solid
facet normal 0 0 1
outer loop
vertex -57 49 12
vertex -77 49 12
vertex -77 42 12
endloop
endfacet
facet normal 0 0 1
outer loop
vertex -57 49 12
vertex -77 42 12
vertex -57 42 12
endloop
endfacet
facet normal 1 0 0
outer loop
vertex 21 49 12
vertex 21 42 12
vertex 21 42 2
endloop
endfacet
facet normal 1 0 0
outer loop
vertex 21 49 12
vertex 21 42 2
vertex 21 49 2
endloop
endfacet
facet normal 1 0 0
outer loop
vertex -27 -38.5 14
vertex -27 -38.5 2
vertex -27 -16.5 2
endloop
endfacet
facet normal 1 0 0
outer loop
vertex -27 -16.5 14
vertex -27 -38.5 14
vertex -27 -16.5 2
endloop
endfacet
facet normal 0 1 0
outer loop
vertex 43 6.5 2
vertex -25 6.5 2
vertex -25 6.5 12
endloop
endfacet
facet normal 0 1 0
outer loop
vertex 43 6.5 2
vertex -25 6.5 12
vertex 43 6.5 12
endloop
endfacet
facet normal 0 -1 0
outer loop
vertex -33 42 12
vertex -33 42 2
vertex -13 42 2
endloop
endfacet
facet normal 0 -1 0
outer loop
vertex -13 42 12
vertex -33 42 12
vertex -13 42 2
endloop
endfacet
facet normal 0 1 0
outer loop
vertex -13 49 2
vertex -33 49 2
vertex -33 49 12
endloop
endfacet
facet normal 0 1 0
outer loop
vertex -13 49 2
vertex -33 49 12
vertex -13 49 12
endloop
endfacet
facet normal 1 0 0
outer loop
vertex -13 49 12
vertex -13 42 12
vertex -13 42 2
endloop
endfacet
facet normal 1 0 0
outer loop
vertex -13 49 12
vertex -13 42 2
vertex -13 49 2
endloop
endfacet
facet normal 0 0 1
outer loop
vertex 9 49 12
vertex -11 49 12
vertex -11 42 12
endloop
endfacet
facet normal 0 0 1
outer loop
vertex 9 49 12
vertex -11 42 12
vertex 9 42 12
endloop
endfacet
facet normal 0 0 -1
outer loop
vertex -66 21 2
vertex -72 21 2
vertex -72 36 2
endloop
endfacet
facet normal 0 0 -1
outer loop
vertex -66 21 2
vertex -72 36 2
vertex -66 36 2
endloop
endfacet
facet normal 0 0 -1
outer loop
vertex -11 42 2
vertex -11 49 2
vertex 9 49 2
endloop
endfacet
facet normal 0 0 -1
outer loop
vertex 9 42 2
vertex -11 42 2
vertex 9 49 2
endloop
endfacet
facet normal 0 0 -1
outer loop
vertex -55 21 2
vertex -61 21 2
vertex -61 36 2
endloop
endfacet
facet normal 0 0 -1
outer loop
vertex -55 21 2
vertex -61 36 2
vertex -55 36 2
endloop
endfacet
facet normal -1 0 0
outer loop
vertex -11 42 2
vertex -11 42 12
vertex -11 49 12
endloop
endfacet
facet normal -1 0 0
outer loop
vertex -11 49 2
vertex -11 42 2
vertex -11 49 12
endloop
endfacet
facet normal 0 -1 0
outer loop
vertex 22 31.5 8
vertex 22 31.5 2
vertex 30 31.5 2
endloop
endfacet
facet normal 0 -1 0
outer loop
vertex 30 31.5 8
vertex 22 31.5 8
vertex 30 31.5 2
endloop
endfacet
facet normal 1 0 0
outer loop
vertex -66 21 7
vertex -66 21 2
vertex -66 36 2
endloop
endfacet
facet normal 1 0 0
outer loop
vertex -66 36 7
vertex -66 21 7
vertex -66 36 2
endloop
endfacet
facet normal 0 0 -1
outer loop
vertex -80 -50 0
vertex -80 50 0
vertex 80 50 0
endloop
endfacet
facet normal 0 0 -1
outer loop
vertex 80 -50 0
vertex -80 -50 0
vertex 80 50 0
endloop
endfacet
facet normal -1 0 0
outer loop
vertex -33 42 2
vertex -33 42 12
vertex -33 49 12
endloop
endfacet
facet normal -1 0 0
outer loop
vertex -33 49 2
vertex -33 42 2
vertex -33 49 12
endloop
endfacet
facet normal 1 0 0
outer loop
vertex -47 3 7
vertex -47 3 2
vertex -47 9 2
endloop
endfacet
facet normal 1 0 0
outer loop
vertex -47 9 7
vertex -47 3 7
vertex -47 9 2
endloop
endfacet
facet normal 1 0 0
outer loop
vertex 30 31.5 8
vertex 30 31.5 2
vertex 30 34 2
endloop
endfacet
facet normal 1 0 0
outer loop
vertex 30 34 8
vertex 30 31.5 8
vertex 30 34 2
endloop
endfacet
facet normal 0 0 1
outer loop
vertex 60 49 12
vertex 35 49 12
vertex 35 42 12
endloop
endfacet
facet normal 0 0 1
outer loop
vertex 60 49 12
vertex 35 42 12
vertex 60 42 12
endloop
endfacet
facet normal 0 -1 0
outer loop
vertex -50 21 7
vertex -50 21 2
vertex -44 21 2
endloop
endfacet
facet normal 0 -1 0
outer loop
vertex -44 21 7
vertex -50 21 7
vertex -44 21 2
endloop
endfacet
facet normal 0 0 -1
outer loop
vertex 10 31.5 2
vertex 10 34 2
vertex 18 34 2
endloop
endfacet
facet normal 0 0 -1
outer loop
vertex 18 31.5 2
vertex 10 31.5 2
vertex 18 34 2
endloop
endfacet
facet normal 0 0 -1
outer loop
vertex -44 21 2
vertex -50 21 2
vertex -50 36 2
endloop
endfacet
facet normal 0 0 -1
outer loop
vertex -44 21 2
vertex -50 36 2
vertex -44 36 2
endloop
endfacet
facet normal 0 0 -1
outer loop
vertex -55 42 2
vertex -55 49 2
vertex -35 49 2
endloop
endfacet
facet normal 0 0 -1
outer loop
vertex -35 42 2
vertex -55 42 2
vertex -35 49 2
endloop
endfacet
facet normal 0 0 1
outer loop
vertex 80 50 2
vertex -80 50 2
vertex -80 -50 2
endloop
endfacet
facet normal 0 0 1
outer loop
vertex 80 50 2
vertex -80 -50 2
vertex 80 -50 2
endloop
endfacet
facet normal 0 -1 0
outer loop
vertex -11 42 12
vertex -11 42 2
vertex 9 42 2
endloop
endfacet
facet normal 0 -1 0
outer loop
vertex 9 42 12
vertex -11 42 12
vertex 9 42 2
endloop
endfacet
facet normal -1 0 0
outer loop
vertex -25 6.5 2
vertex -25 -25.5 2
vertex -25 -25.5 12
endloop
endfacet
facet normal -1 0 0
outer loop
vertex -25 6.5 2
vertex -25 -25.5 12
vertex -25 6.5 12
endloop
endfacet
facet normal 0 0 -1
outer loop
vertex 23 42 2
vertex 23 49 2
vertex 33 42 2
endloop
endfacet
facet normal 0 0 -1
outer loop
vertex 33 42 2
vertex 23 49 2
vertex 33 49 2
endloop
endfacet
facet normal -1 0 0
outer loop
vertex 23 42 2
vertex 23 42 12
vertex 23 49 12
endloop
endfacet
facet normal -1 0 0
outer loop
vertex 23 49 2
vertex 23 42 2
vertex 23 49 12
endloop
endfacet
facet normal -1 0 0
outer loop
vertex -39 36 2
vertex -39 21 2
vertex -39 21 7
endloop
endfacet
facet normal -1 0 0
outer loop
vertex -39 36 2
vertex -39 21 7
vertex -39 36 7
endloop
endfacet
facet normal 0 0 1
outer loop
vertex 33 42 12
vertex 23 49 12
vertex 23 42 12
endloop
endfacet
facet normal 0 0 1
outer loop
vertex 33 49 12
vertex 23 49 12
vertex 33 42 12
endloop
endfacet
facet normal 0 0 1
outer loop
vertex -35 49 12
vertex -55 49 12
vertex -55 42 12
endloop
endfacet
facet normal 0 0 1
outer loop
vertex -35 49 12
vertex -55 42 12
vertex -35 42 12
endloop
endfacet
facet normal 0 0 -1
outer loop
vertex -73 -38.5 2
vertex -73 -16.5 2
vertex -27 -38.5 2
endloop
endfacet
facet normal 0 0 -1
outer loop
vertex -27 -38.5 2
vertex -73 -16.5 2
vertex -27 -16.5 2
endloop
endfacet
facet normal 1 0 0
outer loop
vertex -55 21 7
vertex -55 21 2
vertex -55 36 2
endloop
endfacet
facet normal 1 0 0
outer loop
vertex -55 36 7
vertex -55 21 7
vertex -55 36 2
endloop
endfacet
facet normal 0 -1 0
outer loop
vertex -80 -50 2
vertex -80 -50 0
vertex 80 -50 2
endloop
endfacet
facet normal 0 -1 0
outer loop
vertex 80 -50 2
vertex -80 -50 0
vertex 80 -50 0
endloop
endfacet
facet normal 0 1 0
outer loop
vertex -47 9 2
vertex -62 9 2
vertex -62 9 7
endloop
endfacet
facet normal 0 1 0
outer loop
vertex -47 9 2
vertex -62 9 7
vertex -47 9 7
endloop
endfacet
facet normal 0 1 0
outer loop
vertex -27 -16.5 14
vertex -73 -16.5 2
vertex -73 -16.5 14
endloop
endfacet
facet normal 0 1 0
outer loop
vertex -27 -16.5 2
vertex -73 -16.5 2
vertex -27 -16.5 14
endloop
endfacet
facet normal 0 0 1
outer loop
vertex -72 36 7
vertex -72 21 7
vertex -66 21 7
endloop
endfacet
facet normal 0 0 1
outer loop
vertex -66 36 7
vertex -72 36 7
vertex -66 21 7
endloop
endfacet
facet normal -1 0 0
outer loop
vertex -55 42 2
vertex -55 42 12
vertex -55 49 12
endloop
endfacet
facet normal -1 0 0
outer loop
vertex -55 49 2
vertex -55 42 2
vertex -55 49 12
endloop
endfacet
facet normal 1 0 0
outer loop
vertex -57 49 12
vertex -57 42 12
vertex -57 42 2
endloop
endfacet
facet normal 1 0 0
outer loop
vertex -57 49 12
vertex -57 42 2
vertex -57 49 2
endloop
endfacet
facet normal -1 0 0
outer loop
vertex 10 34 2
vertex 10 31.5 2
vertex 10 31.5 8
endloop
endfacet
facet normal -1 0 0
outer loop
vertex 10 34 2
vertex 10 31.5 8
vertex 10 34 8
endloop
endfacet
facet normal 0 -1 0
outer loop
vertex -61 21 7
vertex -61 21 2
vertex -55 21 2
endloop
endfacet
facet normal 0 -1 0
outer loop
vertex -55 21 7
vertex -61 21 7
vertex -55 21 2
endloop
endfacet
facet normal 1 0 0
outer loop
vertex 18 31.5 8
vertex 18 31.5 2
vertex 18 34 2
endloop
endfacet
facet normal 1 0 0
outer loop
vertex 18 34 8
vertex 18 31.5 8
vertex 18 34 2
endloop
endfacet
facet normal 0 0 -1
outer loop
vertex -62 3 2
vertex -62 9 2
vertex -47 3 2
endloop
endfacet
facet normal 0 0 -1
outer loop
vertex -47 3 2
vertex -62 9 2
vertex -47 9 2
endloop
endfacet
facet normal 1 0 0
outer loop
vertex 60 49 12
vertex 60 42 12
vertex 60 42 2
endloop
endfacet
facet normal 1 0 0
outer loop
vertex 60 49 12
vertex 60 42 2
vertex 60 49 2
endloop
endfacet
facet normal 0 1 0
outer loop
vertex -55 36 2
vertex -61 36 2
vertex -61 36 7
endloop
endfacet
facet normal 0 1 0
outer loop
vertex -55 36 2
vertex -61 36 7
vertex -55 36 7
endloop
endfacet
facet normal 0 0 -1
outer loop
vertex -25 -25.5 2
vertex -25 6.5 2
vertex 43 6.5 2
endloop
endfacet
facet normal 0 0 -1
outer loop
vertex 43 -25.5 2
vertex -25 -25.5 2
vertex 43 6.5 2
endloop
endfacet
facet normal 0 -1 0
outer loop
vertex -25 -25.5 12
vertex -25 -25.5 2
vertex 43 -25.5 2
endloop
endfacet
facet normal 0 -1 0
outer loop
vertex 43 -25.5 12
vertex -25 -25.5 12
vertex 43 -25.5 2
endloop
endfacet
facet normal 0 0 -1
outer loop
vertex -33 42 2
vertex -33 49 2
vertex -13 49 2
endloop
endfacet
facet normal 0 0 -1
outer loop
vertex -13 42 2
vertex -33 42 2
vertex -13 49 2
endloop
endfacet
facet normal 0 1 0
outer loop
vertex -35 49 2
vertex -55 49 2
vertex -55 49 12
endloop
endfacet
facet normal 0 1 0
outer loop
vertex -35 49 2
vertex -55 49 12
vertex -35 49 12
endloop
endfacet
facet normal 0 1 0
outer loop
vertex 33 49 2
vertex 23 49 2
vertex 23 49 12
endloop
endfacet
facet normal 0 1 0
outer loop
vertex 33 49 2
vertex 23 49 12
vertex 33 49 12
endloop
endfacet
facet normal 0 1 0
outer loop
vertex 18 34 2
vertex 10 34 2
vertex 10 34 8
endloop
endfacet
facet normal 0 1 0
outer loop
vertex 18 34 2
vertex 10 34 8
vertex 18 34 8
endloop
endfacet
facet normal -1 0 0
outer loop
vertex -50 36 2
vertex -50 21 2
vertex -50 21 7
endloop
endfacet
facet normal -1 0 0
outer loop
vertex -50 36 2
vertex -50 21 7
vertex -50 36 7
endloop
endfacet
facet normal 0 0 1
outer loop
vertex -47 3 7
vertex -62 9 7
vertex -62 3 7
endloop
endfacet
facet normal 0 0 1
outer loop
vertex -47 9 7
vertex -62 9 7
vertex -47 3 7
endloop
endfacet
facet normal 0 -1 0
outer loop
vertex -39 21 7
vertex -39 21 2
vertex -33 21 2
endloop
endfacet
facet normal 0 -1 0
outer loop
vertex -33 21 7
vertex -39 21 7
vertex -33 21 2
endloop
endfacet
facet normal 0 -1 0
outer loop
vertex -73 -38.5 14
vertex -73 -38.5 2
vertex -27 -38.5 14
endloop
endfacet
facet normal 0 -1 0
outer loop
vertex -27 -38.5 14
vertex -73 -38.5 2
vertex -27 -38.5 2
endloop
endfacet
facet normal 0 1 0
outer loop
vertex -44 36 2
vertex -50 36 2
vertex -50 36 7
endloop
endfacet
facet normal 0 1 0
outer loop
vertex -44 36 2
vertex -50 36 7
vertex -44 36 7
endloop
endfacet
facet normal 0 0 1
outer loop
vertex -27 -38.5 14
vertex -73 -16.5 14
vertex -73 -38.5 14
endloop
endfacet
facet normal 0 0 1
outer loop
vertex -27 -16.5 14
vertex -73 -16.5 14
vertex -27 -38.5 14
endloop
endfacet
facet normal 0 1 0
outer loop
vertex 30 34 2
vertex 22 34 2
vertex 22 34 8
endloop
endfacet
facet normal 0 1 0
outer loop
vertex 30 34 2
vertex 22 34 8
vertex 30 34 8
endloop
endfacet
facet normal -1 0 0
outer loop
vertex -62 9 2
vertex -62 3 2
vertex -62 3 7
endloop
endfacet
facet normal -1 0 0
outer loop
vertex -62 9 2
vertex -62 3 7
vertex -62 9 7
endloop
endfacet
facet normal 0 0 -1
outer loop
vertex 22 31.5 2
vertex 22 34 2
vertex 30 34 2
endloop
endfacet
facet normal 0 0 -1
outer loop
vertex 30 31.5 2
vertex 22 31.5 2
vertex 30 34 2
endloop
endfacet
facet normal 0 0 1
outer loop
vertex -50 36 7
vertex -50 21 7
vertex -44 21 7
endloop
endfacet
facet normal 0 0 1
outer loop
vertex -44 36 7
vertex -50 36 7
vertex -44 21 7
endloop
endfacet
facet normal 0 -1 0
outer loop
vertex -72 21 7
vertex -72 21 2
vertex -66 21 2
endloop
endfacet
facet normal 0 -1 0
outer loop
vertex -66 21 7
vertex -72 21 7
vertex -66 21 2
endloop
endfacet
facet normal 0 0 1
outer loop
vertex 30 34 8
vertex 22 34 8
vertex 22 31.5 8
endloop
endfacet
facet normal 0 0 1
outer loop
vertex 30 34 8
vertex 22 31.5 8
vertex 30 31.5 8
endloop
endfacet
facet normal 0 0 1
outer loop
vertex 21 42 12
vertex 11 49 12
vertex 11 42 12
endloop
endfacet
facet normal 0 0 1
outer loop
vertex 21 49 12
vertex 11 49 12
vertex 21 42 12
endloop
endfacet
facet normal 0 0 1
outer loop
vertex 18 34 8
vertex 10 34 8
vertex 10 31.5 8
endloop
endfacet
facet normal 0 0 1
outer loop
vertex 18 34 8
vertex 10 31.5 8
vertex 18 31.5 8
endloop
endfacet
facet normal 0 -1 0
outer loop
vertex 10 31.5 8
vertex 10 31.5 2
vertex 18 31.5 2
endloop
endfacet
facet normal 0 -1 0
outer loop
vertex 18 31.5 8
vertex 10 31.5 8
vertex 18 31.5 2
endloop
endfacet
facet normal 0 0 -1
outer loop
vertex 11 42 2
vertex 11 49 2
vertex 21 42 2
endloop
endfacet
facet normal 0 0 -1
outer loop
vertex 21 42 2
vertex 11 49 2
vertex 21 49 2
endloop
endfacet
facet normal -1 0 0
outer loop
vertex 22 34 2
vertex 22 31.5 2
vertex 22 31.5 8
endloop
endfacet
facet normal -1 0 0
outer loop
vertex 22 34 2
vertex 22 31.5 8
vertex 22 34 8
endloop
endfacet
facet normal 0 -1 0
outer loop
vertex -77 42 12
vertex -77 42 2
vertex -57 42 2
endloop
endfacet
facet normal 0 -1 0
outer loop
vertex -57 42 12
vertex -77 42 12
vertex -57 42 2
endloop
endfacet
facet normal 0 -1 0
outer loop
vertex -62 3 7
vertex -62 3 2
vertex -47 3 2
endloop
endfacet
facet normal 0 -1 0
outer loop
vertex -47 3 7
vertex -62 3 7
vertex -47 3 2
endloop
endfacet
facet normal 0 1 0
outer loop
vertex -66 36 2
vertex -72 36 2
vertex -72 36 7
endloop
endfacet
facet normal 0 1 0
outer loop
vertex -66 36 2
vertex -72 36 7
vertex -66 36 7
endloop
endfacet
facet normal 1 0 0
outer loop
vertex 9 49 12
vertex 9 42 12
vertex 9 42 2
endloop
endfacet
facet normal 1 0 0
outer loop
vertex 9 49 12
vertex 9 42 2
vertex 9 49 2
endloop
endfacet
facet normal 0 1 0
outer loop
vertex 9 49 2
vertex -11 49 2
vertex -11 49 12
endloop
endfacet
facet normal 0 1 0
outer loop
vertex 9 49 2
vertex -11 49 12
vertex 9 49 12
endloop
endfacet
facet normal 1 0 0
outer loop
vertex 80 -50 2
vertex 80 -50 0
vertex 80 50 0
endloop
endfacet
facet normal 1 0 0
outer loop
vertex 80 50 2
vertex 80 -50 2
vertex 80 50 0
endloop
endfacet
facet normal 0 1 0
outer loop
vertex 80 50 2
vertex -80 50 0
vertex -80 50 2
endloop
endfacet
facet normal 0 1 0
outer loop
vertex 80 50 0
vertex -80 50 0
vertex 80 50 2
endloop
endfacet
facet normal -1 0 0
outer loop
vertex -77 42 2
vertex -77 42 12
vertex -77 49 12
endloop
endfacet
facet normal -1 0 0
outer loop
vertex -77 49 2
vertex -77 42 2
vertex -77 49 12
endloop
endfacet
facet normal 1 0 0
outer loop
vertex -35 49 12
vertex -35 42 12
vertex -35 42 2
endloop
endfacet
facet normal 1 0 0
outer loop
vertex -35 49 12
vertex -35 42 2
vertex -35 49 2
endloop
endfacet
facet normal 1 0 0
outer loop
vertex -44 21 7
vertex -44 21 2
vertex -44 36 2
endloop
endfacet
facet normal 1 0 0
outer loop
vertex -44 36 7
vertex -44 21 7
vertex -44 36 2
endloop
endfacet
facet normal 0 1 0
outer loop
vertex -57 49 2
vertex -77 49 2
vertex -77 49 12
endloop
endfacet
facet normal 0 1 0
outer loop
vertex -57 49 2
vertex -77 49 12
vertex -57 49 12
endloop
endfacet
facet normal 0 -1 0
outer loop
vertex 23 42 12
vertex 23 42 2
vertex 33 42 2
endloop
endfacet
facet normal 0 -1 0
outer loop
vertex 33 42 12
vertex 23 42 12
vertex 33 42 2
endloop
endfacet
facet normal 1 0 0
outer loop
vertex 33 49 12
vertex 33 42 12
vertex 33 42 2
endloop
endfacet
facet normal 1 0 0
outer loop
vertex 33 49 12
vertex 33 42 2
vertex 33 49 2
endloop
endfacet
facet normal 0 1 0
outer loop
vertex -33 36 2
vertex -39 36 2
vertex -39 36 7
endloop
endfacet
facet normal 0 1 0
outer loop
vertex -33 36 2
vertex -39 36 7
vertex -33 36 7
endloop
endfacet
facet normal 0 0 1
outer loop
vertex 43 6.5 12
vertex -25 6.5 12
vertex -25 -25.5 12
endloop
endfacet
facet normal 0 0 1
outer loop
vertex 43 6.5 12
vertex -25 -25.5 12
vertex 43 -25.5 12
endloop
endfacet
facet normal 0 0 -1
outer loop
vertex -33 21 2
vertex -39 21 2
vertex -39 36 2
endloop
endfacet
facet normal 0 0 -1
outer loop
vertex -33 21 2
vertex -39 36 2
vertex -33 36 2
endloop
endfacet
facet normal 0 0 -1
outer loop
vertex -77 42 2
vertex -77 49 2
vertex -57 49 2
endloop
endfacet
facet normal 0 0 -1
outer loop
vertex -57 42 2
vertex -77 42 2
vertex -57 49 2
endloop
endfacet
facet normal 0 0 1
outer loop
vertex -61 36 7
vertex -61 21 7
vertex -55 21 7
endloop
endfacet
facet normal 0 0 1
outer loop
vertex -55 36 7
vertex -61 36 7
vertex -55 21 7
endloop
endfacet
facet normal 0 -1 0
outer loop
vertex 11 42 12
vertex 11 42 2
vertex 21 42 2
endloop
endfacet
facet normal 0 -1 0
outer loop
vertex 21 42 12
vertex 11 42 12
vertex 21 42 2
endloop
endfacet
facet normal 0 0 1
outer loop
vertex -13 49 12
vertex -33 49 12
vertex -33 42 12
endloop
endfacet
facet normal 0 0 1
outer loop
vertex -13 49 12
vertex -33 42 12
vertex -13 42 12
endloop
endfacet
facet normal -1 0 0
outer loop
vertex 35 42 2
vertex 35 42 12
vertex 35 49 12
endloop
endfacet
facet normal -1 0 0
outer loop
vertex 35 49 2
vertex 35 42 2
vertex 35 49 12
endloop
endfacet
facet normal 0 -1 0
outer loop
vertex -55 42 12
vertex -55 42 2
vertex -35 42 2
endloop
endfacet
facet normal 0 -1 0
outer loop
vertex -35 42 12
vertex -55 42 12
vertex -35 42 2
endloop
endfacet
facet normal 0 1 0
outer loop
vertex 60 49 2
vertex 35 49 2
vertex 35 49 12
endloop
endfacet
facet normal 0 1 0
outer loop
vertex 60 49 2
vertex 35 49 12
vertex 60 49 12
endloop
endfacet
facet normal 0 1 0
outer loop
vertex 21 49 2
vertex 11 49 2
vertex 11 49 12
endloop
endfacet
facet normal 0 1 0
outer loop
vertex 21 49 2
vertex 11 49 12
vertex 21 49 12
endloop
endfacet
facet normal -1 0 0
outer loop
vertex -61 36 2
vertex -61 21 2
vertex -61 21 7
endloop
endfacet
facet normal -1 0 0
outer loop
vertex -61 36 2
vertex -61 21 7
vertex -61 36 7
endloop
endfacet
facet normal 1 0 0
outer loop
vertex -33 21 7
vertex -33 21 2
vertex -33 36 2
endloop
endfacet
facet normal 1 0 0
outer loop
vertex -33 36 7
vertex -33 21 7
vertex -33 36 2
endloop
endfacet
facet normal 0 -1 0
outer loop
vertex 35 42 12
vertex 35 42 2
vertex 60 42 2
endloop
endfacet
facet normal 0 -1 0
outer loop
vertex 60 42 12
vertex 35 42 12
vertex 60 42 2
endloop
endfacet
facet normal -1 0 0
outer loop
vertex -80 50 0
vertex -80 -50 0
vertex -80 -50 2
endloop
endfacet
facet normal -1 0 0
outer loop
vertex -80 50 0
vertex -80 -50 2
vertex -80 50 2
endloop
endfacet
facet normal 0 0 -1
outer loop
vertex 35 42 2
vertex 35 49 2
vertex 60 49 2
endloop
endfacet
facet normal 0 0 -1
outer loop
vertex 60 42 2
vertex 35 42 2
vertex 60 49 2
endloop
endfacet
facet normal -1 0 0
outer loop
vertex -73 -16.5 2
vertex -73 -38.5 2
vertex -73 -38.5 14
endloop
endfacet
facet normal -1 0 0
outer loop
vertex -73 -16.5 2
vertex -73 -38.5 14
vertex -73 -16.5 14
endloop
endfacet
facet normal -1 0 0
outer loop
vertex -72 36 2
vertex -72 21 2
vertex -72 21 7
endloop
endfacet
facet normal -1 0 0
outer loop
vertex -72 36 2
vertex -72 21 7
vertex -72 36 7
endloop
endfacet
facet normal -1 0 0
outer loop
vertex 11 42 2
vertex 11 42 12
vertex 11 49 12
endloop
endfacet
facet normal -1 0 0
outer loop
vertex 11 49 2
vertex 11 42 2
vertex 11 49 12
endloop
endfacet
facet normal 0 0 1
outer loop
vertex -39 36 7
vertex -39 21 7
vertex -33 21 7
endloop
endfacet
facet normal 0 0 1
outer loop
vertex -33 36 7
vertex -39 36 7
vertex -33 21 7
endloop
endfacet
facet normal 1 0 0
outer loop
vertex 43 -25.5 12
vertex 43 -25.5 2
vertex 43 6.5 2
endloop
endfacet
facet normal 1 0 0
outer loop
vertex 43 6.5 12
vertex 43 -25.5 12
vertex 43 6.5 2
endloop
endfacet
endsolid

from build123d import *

# Parameters (mm, degrees)
F0_W      = 160
F0_H      = 100
F1_DEPTH  = 2
F2_W      = 20
F2_H      = 7
F2_W_2    = 10
F2_W_3    = 25
F3_DEPTH  = 10
F4_W      = 6
F4_H      = 15
F4_W_2    = 15
F4_H_2    = 6
F5_DEPTH  = 5
F6_W      = 8
F6_H      = 2.5
F7_DEPTH  = 6
F8_W      = 68
F8_H      = 32
F9_DEPTH  = 10
F10_W     = 46
F10_H     = 22
F11_DEPTH = 12


with BuildPart() as f1:
    # F0 (on Top) → F1 (new body)
    with BuildSketch(Plane.XY):
        Rectangle(F0_W, F0_H)
    extrude(amount=F1_DEPTH)


with BuildPart() as f3:
    # F2 (on face) → F3 (new body)
    with BuildSketch(Plane.XY.offset(2)):
        with Locations((-67, 45.5)):
            Rectangle(F2_W, F2_H)
        with Locations((-45, 45.5)):
            Rectangle(F2_W, F2_H)
        with Locations((-23, 45.5)):
            Rectangle(F2_W, F2_H)
        with Locations((16, 45.5)):
            Rectangle(F2_W_2, F2_H)
        with Locations((-1, 45.5)):
            Rectangle(F2_W, F2_H)
        with Locations((28, 45.5)):
            Rectangle(F2_W_2, F2_H)
        with Locations((47.5, 45.5)):
            Rectangle(F2_W_3, F2_H)
    extrude(amount=F3_DEPTH)


with BuildPart() as f5:
    # F4 (on face) → F5 (new body)
    with BuildSketch(Plane.XY.offset(2)):
        with Locations((-69, 28.5)):
            Rectangle(F4_W, F4_H)
        with Locations((-58, 28.5)):
            Rectangle(F4_W, F4_H)
        with Locations((-47, 28.5)):
            Rectangle(F4_W, F4_H)
        with Locations((-36, 28.5)):
            Rectangle(F4_W, F4_H)
        with Locations((-54.5, 6)):
            Rectangle(F4_W_2, F4_H_2)
    extrude(amount=F5_DEPTH)


with BuildPart() as f7:
    # F6 (on face) → F7 (new body)
    with BuildSketch(Plane.XY.offset(2)):
        with Locations((14, 32.75)):
            Rectangle(F6_W, F6_H)
        with Locations((26, 32.75)):
            Rectangle(F6_W, F6_H)
    extrude(amount=F7_DEPTH)


with BuildPart() as f9:
    # F8 (on face) → F9 (new body)
    with BuildSketch(Plane.XY.offset(2)):
        with Locations((9, -9.5)):
            Rectangle(F8_W, F8_H)
    extrude(amount=F9_DEPTH)


with BuildPart() as f11:
    # F10 (on face) → F11 (new body)
    with BuildSketch(Plane.XY.offset(2)):
        with Locations((-50, -27.5)):
            Rectangle(F10_W, F10_H)
    extrude(amount=F11_DEPTH)


solid = Compound([f1.part, f3.part, f5.part, f7.part, f9.part, f11.part])
